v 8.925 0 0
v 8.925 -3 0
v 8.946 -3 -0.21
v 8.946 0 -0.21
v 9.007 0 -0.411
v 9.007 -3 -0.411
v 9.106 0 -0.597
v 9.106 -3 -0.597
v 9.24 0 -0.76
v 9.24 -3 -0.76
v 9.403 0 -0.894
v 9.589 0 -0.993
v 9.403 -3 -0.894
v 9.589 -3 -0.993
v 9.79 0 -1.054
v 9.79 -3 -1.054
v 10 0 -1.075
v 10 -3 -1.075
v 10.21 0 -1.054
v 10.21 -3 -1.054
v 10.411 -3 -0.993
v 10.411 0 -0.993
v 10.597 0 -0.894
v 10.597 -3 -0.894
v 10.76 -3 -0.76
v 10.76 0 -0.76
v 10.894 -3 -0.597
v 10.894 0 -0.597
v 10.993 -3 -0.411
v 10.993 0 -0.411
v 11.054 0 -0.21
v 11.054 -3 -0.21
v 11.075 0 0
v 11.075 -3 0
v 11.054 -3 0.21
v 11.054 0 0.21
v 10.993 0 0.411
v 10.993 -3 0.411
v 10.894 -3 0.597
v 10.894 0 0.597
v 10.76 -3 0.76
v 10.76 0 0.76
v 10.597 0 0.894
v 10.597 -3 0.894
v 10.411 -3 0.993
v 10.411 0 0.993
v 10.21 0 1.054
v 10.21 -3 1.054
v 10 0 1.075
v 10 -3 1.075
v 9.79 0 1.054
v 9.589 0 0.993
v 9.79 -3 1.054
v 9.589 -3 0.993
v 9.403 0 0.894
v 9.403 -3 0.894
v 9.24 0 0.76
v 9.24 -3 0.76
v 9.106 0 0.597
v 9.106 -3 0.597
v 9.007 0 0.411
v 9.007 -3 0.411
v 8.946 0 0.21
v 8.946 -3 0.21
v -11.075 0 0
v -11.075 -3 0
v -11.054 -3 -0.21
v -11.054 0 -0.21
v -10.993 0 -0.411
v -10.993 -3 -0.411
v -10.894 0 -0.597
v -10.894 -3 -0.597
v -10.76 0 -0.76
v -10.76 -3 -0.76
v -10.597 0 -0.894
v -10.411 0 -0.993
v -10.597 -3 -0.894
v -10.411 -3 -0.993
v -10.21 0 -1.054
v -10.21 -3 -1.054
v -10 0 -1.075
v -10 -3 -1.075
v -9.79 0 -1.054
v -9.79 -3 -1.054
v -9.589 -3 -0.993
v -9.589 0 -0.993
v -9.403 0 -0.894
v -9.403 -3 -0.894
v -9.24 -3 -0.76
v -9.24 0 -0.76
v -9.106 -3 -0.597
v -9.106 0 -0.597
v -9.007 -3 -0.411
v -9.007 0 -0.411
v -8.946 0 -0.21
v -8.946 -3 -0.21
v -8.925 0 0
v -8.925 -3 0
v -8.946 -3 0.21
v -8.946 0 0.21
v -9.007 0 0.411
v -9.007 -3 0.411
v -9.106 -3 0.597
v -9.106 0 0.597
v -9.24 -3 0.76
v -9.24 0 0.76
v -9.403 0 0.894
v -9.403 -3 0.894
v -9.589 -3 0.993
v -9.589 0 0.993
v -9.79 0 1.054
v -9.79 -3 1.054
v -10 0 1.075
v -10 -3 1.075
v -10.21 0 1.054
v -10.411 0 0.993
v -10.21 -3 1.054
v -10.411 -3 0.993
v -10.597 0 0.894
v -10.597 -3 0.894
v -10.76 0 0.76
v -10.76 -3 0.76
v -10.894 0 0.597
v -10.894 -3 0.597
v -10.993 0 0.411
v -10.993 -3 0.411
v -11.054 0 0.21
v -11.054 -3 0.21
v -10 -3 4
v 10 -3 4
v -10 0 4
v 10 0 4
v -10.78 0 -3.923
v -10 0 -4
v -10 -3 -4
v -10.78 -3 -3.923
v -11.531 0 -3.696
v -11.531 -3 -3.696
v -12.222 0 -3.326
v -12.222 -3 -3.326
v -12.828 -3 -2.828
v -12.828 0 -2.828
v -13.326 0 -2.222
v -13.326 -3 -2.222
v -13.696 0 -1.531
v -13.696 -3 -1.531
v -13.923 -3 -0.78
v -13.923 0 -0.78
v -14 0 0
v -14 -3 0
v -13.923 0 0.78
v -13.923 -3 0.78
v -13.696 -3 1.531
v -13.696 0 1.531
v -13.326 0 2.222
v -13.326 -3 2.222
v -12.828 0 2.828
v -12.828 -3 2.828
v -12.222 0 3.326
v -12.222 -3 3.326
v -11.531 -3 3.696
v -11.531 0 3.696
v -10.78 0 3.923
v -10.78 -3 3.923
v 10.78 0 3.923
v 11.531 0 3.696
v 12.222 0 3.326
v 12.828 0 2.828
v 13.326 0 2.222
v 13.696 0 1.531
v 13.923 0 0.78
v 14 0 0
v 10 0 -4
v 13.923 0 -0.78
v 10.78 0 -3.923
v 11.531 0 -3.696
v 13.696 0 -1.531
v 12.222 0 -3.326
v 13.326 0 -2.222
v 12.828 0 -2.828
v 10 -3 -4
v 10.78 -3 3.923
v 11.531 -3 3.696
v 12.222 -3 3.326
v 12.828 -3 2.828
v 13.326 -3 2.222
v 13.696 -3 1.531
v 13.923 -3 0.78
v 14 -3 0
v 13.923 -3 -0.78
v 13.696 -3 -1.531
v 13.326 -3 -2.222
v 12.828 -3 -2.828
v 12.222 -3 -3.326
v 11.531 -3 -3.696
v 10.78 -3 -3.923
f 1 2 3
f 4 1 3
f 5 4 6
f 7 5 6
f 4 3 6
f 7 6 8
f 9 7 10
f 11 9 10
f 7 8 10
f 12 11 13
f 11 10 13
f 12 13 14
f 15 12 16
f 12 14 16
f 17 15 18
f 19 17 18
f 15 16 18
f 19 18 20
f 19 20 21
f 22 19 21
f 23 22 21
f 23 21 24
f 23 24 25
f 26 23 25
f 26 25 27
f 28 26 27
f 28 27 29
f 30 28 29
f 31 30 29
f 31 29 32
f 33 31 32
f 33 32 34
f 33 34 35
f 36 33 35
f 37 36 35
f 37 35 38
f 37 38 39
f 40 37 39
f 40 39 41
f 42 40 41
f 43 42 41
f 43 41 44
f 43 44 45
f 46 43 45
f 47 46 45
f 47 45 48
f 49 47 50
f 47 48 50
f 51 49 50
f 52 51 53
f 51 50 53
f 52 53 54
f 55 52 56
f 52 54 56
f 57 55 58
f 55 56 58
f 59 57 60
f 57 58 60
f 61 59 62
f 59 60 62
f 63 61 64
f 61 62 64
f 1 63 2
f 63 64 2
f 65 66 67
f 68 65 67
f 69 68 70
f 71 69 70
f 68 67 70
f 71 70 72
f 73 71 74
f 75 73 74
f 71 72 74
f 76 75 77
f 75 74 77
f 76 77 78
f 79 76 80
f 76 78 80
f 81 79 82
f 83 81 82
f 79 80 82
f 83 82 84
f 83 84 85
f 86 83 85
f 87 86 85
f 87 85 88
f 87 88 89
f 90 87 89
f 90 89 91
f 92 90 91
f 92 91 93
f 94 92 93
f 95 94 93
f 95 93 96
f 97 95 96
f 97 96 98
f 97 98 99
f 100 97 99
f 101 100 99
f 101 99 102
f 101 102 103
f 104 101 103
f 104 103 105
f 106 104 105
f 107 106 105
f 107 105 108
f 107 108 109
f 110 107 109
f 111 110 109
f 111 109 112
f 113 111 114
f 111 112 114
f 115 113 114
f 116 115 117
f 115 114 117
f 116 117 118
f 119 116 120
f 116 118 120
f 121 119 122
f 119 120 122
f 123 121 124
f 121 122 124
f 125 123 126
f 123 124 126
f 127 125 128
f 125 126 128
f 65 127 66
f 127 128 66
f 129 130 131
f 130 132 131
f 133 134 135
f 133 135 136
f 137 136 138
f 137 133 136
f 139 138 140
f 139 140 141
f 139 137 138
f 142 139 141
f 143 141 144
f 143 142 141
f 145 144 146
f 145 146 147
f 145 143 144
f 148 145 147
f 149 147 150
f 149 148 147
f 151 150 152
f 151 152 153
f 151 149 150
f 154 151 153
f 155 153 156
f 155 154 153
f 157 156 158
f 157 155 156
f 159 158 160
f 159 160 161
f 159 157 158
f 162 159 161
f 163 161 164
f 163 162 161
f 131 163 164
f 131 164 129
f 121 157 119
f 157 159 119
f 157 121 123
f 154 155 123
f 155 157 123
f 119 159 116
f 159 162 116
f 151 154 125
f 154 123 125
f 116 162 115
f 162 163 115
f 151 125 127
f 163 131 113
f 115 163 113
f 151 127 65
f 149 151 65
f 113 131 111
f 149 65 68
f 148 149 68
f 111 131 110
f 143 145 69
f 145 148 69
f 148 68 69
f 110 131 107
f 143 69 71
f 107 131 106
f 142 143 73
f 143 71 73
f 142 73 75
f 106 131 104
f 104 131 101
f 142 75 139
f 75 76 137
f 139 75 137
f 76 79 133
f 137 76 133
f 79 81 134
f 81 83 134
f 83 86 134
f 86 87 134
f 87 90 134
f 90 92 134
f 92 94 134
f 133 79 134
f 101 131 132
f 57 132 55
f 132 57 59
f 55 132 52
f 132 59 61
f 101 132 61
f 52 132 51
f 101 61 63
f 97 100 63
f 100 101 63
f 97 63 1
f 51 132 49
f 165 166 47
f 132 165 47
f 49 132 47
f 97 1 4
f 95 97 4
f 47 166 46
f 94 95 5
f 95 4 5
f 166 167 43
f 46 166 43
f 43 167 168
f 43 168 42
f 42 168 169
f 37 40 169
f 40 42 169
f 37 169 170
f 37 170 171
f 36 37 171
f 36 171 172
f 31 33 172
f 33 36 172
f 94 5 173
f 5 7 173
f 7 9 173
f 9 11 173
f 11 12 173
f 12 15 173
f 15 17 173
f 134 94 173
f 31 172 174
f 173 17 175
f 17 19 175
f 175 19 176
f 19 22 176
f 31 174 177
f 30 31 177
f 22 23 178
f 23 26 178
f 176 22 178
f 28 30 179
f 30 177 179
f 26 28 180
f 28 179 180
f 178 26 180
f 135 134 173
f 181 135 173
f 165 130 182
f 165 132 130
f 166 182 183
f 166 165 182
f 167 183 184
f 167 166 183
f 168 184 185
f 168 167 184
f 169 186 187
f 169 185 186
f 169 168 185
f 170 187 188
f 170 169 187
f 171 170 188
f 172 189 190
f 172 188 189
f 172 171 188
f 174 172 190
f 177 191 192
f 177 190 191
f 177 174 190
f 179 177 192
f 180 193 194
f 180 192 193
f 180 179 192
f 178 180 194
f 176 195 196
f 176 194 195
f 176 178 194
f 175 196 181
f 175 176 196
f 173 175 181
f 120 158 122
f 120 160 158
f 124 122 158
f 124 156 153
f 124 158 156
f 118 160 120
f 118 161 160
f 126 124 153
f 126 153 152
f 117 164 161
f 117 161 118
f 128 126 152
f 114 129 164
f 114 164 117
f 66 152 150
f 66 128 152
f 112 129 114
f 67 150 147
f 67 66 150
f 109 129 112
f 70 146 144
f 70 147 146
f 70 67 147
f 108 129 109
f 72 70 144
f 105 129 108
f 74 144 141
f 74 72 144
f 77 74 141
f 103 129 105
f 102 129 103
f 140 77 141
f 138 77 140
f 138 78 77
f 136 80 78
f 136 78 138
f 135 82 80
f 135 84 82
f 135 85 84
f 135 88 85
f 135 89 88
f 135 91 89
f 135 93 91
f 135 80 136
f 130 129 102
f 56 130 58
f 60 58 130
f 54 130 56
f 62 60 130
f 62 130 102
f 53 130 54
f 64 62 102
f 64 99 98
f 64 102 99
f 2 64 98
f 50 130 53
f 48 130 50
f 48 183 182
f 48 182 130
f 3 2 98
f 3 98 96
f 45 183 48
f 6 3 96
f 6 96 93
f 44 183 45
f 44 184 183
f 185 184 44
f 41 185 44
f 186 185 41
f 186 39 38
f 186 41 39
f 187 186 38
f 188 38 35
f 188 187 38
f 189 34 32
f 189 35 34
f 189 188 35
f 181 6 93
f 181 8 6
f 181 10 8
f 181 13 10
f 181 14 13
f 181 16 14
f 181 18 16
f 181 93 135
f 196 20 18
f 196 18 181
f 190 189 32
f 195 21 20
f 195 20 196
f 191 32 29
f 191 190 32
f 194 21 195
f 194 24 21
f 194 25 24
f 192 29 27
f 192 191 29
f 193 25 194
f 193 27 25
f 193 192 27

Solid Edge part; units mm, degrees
sketch "Sketch1" plane through (0, 0, 0) normal (0, -1, 0) x (1, 0, 0)
  line L0 (-10, -4) -> (10, -4)
  arc A0 (10, -4) -> (10, 4) centre (10, 0) ccw
  line L1 (10, 4) -> (-10, 4)
  arc A1 (-10, -4) -> (-10, 4) centre (-10, 0) cw
  dimension "D1" = 20
  dimension "D2" = 8
extrude "Ajout_matière_1" add sketch "Sketch1" along normal blind 3
sketch "Sketch2" plane through (0, -3, 0) normal (0, -1, 0) x (-1, 0, 0)
  circle A0 centre (-10, 0) radius 1.075
  circle A1 centre (10, 0) radius 1.075
  dimension "D1" = 2.15
extrude "Enlèvement_matière_1" cut sketch "Sketch2" against normal blind 5.6361
properties part number "12" material "MDF 3mm"
